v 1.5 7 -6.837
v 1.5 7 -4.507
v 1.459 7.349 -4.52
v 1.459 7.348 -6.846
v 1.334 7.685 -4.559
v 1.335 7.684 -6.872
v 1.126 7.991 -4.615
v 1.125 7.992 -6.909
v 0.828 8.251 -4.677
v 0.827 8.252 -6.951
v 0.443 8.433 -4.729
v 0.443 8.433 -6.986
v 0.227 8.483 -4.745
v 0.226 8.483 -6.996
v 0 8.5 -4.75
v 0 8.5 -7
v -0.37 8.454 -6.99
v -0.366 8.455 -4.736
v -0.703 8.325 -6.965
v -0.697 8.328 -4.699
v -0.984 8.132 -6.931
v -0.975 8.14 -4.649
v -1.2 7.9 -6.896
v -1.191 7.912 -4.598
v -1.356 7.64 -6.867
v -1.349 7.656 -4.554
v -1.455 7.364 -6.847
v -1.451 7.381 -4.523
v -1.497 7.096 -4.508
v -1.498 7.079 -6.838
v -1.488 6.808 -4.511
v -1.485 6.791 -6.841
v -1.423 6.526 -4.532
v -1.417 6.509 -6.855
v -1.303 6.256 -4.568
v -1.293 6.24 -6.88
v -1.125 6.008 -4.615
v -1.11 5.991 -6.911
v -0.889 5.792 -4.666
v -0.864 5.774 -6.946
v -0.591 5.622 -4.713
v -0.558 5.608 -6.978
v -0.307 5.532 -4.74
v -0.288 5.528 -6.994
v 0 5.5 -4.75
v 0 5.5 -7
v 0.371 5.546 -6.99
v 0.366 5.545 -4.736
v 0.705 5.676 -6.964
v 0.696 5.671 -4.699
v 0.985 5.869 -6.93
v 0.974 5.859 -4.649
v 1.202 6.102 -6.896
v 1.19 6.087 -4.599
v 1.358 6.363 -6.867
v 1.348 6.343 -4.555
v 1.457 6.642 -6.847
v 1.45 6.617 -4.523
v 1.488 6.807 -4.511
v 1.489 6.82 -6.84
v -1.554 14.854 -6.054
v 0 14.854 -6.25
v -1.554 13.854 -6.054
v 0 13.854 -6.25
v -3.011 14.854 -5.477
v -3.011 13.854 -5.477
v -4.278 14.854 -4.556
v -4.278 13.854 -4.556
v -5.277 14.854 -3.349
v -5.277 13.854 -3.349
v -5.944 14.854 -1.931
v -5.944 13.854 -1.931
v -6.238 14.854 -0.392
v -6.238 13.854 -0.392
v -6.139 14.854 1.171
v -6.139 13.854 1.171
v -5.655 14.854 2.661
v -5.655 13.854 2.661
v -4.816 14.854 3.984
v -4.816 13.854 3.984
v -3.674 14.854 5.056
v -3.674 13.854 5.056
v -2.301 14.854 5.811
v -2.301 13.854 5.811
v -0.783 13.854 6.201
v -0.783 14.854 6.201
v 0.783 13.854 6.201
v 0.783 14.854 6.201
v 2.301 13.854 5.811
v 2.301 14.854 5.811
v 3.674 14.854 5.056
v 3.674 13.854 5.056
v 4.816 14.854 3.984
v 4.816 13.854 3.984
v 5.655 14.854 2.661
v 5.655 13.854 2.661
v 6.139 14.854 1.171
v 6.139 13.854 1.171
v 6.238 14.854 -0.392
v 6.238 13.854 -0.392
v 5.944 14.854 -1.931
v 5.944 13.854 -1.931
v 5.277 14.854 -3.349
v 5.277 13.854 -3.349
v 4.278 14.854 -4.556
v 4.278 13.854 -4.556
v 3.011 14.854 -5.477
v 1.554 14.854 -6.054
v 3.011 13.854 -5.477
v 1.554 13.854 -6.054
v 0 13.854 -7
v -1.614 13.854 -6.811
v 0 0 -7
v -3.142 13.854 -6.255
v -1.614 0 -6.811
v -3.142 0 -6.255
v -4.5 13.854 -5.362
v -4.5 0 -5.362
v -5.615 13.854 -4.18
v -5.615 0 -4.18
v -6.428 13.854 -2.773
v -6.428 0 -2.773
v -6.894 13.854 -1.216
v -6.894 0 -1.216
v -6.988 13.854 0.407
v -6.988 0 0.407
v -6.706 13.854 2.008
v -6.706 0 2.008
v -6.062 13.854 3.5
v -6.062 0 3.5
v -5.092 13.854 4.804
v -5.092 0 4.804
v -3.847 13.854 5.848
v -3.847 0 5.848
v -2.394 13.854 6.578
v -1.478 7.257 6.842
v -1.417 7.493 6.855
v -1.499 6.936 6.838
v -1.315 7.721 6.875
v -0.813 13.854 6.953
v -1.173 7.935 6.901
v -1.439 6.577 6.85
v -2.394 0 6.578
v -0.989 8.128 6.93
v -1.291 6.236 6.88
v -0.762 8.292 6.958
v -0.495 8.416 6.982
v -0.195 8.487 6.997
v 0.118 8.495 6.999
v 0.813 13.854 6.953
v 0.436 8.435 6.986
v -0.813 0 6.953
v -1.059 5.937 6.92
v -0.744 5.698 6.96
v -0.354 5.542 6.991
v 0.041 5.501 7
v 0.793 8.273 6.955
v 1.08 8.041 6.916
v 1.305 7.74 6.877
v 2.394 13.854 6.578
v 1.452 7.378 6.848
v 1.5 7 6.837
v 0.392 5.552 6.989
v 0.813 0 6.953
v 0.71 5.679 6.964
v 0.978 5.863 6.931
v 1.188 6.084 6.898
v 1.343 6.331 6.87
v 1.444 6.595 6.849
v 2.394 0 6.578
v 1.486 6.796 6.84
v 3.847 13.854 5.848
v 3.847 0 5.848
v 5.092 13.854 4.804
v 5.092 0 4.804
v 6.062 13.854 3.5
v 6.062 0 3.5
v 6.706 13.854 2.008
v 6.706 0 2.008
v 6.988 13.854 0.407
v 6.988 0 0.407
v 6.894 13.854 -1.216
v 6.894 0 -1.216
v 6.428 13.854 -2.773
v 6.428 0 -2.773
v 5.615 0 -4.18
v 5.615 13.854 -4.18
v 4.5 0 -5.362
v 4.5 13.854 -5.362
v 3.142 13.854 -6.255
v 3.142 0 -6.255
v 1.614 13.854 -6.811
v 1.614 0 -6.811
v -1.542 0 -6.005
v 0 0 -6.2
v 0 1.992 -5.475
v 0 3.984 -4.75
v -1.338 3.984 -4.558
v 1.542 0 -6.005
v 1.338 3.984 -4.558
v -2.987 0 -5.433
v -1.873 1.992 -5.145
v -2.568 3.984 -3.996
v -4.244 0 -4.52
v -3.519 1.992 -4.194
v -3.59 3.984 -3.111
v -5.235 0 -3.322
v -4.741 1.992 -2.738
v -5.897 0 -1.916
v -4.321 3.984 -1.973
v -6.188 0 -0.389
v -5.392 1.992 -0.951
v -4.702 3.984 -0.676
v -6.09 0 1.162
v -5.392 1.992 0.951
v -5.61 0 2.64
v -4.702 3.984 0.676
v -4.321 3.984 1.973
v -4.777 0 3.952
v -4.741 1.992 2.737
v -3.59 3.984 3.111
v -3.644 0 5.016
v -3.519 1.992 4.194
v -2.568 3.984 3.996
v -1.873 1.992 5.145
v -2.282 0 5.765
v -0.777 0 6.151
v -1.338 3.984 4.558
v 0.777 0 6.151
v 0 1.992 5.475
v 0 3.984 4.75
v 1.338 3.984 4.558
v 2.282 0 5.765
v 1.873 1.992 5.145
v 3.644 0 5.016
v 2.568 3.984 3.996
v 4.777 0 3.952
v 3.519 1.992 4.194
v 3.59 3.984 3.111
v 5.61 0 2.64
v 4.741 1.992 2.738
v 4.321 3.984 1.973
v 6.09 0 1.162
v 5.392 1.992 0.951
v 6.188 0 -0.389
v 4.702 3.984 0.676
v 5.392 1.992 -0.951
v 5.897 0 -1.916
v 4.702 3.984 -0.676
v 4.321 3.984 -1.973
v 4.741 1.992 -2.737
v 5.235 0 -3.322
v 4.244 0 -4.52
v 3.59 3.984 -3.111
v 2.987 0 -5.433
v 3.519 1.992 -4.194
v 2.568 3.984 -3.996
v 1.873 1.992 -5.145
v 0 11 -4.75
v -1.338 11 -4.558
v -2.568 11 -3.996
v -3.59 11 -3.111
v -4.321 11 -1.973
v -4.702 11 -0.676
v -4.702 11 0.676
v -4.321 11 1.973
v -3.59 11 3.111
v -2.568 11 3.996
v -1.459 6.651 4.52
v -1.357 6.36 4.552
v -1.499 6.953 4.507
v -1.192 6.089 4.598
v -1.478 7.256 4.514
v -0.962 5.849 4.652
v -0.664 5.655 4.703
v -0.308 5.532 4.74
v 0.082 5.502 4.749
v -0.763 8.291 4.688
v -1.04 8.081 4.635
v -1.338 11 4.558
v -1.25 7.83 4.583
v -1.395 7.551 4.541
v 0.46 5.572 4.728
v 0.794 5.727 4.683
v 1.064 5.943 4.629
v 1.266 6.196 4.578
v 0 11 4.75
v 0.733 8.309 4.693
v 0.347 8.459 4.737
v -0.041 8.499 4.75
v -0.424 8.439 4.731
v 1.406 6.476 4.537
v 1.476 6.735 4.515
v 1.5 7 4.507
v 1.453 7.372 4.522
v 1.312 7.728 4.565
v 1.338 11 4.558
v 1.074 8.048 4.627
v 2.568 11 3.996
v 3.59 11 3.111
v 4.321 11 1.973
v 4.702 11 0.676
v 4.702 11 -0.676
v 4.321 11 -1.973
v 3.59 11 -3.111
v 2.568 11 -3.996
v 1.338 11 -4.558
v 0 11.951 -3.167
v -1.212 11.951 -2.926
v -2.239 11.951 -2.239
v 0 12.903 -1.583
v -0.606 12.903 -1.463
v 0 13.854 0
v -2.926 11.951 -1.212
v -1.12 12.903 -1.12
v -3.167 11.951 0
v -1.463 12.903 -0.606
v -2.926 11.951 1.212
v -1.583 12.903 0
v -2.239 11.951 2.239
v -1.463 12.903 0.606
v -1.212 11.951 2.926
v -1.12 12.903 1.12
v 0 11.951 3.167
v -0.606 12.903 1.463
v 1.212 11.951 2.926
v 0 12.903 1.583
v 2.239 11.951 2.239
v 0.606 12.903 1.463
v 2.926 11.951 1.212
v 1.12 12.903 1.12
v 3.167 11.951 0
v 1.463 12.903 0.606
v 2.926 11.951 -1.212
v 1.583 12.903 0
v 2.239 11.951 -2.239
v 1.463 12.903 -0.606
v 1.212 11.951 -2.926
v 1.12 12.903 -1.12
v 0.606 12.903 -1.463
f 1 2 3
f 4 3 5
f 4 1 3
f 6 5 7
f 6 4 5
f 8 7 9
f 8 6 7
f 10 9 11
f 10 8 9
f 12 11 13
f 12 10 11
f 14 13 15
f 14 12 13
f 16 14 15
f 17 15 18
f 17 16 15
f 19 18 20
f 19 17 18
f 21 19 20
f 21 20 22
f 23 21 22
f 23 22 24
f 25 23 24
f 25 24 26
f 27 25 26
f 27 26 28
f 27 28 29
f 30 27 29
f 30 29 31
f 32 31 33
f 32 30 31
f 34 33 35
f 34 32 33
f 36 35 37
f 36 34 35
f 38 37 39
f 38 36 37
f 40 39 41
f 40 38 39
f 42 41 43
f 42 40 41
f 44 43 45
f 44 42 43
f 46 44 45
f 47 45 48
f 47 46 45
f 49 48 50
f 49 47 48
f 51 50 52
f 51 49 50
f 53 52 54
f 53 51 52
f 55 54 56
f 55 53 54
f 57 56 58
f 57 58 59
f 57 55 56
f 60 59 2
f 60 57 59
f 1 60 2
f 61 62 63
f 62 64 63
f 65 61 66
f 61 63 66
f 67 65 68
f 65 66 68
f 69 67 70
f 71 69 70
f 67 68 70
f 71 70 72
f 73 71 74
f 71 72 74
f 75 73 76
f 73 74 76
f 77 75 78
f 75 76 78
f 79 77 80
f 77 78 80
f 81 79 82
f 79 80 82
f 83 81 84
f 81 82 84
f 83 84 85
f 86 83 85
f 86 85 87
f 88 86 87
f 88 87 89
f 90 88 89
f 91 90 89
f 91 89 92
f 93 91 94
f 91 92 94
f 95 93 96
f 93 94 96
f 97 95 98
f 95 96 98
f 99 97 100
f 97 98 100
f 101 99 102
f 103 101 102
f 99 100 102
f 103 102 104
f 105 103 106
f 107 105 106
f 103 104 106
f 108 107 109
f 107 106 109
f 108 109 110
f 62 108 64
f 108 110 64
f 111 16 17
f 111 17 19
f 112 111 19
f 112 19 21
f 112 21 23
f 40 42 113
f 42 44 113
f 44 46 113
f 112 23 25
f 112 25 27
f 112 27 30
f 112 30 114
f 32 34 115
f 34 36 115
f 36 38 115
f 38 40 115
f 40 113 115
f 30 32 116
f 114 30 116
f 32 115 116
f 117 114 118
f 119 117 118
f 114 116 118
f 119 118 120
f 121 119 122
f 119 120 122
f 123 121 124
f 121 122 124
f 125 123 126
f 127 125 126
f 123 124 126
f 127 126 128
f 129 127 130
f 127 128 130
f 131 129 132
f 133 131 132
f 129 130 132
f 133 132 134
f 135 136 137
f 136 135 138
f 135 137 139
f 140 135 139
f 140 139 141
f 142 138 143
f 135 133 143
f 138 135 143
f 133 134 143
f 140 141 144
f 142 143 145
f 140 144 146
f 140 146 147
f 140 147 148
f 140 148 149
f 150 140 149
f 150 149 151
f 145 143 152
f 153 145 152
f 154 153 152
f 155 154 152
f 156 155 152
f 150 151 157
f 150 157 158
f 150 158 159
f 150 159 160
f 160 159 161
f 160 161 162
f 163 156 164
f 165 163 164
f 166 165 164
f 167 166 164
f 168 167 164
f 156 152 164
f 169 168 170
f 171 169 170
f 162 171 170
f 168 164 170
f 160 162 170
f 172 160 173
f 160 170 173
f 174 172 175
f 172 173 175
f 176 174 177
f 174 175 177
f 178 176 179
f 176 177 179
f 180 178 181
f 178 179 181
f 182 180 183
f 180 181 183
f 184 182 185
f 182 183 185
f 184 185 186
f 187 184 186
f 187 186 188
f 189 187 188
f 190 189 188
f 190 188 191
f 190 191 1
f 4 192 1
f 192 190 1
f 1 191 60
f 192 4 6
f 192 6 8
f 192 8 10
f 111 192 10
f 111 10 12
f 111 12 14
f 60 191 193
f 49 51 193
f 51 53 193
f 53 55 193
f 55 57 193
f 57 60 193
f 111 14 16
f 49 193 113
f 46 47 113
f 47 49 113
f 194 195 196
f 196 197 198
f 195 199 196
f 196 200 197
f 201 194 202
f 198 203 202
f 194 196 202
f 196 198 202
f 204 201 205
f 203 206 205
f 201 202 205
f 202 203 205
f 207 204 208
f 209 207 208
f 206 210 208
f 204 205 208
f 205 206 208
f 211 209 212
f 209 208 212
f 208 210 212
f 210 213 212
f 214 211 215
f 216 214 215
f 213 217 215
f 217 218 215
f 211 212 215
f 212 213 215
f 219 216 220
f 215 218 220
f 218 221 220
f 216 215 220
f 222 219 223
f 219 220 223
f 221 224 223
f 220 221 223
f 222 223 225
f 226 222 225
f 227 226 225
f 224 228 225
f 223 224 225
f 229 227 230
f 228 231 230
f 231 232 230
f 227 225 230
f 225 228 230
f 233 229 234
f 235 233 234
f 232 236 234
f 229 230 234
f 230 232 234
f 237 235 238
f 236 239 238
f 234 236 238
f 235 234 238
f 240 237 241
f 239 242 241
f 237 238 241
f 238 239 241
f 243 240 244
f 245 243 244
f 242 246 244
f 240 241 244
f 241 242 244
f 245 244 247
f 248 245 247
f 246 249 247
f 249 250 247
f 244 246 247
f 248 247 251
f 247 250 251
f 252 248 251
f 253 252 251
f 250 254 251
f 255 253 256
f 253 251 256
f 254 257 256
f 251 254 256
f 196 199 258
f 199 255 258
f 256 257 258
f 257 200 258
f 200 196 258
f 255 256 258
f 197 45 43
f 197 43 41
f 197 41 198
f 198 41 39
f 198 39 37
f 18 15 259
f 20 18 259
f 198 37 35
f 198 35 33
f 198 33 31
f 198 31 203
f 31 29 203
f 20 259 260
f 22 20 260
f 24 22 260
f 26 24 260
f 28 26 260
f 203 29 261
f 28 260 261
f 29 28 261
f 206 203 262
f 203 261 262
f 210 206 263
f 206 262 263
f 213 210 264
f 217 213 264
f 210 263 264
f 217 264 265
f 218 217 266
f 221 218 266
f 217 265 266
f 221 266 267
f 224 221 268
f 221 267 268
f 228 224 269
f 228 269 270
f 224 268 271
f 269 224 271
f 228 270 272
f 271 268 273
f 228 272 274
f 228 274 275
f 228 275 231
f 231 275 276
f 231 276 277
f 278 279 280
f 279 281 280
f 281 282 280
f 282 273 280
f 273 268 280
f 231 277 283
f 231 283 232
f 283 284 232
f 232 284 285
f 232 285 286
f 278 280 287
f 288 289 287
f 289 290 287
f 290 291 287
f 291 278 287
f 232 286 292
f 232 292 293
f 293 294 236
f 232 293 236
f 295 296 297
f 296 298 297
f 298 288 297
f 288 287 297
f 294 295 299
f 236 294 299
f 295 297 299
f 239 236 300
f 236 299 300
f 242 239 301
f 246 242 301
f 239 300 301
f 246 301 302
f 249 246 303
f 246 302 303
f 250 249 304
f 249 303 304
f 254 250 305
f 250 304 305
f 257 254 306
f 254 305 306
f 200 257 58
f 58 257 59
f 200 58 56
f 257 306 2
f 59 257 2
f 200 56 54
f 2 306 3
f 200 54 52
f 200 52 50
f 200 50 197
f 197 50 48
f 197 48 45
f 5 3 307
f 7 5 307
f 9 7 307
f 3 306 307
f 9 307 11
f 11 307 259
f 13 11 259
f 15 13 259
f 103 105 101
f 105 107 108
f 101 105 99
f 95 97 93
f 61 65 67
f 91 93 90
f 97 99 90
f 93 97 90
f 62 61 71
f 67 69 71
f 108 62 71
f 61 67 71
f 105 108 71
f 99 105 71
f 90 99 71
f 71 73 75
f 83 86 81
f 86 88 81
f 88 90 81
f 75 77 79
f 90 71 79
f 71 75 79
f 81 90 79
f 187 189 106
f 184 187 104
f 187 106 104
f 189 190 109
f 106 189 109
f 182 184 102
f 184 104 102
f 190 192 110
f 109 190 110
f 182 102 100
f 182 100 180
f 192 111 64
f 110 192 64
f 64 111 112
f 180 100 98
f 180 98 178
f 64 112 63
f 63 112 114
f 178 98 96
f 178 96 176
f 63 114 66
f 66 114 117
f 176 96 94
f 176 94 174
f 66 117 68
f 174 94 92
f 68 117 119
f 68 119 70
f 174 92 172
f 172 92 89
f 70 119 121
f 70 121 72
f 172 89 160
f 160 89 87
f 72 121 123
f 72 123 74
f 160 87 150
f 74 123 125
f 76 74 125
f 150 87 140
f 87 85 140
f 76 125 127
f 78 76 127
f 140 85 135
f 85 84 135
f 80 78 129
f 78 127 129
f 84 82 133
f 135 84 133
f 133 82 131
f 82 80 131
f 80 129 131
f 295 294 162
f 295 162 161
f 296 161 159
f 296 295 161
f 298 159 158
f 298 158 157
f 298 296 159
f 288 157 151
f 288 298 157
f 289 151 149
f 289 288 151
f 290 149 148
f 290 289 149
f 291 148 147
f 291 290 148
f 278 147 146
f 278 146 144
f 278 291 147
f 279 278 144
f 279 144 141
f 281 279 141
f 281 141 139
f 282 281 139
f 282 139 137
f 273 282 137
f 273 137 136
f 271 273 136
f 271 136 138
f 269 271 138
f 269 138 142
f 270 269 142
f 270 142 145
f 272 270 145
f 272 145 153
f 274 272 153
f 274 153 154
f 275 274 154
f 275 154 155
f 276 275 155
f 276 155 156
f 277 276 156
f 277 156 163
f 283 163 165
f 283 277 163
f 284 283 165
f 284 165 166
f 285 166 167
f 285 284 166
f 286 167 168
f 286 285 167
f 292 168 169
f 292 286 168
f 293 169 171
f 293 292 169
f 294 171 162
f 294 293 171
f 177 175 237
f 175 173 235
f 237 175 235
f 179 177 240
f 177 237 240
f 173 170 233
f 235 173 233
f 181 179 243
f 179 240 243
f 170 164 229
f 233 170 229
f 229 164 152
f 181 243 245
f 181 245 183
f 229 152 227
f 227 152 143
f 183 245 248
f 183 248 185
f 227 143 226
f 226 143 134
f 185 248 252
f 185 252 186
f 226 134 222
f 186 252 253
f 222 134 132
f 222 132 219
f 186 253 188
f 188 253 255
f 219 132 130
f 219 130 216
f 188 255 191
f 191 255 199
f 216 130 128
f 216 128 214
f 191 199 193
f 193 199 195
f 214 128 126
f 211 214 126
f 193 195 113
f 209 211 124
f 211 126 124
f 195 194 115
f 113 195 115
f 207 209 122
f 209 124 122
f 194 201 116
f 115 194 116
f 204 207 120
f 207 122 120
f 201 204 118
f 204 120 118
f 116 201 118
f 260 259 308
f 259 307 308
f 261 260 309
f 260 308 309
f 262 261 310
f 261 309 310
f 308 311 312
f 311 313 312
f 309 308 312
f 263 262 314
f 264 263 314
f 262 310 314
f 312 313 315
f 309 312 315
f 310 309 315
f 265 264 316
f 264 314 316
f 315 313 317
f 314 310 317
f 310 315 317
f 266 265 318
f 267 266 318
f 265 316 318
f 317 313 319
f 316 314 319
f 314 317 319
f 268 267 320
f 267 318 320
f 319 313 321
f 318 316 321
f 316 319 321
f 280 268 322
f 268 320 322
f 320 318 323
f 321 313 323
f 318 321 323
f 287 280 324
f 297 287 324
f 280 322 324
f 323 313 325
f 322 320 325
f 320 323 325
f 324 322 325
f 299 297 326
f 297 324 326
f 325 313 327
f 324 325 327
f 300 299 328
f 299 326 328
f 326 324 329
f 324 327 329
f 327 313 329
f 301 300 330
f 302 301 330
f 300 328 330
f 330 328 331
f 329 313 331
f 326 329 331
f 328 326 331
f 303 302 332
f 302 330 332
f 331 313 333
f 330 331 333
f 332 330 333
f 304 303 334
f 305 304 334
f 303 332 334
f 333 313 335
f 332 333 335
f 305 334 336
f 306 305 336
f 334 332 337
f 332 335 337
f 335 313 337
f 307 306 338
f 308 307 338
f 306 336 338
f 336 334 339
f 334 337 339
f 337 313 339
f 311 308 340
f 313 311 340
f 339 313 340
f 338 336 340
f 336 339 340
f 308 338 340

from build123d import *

# Parameters (mm, degrees)
CUT_EXTRUDE1_DEPTH      = 18.850600229
CUT_EXTRUDE1_DEPTH_BACK = 18.850600229
SKETCH2_R               = 1.5


with BuildPart() as part:
    # Sketch1 → Revolve1 (revolve)
    with BuildSketch(Plane(origin=(0, 0, 0), x_dir=(0, 0, -1), z_dir=(1, 0, 0)), mode=Mode.PRIVATE) as revolve1_sk:
        Polygon((0, 14.85408794), (-6.25, 14.85408794), (-6.25, 13.85408794), (-7, 13.85408794), (-7, 0), (-6.2, 0), (-4.75, 3.983842258), (-4.75, 11), (0, 13.85408794), align=None)
    revolve(revolve1_sk.sketch.rotate(Axis((0, 0, 0), (0, 1, 0)), 180), axis=Axis((0, 0, 0), (0, 1, 0)))

    # Sketch2 → Cut-Extrude1 (cut, two sides: drawn at the far end of the back side and taken through both)
    with BuildSketch(Plane.XY.offset(-CUT_EXTRUDE1_DEPTH_BACK)):
        with Locations((0, 7)):
            Circle(SKETCH2_R)
    extrude(amount=CUT_EXTRUDE1_DEPTH + CUT_EXTRUDE1_DEPTH_BACK, mode=Mode.SUBTRACT)


solid = part.part
